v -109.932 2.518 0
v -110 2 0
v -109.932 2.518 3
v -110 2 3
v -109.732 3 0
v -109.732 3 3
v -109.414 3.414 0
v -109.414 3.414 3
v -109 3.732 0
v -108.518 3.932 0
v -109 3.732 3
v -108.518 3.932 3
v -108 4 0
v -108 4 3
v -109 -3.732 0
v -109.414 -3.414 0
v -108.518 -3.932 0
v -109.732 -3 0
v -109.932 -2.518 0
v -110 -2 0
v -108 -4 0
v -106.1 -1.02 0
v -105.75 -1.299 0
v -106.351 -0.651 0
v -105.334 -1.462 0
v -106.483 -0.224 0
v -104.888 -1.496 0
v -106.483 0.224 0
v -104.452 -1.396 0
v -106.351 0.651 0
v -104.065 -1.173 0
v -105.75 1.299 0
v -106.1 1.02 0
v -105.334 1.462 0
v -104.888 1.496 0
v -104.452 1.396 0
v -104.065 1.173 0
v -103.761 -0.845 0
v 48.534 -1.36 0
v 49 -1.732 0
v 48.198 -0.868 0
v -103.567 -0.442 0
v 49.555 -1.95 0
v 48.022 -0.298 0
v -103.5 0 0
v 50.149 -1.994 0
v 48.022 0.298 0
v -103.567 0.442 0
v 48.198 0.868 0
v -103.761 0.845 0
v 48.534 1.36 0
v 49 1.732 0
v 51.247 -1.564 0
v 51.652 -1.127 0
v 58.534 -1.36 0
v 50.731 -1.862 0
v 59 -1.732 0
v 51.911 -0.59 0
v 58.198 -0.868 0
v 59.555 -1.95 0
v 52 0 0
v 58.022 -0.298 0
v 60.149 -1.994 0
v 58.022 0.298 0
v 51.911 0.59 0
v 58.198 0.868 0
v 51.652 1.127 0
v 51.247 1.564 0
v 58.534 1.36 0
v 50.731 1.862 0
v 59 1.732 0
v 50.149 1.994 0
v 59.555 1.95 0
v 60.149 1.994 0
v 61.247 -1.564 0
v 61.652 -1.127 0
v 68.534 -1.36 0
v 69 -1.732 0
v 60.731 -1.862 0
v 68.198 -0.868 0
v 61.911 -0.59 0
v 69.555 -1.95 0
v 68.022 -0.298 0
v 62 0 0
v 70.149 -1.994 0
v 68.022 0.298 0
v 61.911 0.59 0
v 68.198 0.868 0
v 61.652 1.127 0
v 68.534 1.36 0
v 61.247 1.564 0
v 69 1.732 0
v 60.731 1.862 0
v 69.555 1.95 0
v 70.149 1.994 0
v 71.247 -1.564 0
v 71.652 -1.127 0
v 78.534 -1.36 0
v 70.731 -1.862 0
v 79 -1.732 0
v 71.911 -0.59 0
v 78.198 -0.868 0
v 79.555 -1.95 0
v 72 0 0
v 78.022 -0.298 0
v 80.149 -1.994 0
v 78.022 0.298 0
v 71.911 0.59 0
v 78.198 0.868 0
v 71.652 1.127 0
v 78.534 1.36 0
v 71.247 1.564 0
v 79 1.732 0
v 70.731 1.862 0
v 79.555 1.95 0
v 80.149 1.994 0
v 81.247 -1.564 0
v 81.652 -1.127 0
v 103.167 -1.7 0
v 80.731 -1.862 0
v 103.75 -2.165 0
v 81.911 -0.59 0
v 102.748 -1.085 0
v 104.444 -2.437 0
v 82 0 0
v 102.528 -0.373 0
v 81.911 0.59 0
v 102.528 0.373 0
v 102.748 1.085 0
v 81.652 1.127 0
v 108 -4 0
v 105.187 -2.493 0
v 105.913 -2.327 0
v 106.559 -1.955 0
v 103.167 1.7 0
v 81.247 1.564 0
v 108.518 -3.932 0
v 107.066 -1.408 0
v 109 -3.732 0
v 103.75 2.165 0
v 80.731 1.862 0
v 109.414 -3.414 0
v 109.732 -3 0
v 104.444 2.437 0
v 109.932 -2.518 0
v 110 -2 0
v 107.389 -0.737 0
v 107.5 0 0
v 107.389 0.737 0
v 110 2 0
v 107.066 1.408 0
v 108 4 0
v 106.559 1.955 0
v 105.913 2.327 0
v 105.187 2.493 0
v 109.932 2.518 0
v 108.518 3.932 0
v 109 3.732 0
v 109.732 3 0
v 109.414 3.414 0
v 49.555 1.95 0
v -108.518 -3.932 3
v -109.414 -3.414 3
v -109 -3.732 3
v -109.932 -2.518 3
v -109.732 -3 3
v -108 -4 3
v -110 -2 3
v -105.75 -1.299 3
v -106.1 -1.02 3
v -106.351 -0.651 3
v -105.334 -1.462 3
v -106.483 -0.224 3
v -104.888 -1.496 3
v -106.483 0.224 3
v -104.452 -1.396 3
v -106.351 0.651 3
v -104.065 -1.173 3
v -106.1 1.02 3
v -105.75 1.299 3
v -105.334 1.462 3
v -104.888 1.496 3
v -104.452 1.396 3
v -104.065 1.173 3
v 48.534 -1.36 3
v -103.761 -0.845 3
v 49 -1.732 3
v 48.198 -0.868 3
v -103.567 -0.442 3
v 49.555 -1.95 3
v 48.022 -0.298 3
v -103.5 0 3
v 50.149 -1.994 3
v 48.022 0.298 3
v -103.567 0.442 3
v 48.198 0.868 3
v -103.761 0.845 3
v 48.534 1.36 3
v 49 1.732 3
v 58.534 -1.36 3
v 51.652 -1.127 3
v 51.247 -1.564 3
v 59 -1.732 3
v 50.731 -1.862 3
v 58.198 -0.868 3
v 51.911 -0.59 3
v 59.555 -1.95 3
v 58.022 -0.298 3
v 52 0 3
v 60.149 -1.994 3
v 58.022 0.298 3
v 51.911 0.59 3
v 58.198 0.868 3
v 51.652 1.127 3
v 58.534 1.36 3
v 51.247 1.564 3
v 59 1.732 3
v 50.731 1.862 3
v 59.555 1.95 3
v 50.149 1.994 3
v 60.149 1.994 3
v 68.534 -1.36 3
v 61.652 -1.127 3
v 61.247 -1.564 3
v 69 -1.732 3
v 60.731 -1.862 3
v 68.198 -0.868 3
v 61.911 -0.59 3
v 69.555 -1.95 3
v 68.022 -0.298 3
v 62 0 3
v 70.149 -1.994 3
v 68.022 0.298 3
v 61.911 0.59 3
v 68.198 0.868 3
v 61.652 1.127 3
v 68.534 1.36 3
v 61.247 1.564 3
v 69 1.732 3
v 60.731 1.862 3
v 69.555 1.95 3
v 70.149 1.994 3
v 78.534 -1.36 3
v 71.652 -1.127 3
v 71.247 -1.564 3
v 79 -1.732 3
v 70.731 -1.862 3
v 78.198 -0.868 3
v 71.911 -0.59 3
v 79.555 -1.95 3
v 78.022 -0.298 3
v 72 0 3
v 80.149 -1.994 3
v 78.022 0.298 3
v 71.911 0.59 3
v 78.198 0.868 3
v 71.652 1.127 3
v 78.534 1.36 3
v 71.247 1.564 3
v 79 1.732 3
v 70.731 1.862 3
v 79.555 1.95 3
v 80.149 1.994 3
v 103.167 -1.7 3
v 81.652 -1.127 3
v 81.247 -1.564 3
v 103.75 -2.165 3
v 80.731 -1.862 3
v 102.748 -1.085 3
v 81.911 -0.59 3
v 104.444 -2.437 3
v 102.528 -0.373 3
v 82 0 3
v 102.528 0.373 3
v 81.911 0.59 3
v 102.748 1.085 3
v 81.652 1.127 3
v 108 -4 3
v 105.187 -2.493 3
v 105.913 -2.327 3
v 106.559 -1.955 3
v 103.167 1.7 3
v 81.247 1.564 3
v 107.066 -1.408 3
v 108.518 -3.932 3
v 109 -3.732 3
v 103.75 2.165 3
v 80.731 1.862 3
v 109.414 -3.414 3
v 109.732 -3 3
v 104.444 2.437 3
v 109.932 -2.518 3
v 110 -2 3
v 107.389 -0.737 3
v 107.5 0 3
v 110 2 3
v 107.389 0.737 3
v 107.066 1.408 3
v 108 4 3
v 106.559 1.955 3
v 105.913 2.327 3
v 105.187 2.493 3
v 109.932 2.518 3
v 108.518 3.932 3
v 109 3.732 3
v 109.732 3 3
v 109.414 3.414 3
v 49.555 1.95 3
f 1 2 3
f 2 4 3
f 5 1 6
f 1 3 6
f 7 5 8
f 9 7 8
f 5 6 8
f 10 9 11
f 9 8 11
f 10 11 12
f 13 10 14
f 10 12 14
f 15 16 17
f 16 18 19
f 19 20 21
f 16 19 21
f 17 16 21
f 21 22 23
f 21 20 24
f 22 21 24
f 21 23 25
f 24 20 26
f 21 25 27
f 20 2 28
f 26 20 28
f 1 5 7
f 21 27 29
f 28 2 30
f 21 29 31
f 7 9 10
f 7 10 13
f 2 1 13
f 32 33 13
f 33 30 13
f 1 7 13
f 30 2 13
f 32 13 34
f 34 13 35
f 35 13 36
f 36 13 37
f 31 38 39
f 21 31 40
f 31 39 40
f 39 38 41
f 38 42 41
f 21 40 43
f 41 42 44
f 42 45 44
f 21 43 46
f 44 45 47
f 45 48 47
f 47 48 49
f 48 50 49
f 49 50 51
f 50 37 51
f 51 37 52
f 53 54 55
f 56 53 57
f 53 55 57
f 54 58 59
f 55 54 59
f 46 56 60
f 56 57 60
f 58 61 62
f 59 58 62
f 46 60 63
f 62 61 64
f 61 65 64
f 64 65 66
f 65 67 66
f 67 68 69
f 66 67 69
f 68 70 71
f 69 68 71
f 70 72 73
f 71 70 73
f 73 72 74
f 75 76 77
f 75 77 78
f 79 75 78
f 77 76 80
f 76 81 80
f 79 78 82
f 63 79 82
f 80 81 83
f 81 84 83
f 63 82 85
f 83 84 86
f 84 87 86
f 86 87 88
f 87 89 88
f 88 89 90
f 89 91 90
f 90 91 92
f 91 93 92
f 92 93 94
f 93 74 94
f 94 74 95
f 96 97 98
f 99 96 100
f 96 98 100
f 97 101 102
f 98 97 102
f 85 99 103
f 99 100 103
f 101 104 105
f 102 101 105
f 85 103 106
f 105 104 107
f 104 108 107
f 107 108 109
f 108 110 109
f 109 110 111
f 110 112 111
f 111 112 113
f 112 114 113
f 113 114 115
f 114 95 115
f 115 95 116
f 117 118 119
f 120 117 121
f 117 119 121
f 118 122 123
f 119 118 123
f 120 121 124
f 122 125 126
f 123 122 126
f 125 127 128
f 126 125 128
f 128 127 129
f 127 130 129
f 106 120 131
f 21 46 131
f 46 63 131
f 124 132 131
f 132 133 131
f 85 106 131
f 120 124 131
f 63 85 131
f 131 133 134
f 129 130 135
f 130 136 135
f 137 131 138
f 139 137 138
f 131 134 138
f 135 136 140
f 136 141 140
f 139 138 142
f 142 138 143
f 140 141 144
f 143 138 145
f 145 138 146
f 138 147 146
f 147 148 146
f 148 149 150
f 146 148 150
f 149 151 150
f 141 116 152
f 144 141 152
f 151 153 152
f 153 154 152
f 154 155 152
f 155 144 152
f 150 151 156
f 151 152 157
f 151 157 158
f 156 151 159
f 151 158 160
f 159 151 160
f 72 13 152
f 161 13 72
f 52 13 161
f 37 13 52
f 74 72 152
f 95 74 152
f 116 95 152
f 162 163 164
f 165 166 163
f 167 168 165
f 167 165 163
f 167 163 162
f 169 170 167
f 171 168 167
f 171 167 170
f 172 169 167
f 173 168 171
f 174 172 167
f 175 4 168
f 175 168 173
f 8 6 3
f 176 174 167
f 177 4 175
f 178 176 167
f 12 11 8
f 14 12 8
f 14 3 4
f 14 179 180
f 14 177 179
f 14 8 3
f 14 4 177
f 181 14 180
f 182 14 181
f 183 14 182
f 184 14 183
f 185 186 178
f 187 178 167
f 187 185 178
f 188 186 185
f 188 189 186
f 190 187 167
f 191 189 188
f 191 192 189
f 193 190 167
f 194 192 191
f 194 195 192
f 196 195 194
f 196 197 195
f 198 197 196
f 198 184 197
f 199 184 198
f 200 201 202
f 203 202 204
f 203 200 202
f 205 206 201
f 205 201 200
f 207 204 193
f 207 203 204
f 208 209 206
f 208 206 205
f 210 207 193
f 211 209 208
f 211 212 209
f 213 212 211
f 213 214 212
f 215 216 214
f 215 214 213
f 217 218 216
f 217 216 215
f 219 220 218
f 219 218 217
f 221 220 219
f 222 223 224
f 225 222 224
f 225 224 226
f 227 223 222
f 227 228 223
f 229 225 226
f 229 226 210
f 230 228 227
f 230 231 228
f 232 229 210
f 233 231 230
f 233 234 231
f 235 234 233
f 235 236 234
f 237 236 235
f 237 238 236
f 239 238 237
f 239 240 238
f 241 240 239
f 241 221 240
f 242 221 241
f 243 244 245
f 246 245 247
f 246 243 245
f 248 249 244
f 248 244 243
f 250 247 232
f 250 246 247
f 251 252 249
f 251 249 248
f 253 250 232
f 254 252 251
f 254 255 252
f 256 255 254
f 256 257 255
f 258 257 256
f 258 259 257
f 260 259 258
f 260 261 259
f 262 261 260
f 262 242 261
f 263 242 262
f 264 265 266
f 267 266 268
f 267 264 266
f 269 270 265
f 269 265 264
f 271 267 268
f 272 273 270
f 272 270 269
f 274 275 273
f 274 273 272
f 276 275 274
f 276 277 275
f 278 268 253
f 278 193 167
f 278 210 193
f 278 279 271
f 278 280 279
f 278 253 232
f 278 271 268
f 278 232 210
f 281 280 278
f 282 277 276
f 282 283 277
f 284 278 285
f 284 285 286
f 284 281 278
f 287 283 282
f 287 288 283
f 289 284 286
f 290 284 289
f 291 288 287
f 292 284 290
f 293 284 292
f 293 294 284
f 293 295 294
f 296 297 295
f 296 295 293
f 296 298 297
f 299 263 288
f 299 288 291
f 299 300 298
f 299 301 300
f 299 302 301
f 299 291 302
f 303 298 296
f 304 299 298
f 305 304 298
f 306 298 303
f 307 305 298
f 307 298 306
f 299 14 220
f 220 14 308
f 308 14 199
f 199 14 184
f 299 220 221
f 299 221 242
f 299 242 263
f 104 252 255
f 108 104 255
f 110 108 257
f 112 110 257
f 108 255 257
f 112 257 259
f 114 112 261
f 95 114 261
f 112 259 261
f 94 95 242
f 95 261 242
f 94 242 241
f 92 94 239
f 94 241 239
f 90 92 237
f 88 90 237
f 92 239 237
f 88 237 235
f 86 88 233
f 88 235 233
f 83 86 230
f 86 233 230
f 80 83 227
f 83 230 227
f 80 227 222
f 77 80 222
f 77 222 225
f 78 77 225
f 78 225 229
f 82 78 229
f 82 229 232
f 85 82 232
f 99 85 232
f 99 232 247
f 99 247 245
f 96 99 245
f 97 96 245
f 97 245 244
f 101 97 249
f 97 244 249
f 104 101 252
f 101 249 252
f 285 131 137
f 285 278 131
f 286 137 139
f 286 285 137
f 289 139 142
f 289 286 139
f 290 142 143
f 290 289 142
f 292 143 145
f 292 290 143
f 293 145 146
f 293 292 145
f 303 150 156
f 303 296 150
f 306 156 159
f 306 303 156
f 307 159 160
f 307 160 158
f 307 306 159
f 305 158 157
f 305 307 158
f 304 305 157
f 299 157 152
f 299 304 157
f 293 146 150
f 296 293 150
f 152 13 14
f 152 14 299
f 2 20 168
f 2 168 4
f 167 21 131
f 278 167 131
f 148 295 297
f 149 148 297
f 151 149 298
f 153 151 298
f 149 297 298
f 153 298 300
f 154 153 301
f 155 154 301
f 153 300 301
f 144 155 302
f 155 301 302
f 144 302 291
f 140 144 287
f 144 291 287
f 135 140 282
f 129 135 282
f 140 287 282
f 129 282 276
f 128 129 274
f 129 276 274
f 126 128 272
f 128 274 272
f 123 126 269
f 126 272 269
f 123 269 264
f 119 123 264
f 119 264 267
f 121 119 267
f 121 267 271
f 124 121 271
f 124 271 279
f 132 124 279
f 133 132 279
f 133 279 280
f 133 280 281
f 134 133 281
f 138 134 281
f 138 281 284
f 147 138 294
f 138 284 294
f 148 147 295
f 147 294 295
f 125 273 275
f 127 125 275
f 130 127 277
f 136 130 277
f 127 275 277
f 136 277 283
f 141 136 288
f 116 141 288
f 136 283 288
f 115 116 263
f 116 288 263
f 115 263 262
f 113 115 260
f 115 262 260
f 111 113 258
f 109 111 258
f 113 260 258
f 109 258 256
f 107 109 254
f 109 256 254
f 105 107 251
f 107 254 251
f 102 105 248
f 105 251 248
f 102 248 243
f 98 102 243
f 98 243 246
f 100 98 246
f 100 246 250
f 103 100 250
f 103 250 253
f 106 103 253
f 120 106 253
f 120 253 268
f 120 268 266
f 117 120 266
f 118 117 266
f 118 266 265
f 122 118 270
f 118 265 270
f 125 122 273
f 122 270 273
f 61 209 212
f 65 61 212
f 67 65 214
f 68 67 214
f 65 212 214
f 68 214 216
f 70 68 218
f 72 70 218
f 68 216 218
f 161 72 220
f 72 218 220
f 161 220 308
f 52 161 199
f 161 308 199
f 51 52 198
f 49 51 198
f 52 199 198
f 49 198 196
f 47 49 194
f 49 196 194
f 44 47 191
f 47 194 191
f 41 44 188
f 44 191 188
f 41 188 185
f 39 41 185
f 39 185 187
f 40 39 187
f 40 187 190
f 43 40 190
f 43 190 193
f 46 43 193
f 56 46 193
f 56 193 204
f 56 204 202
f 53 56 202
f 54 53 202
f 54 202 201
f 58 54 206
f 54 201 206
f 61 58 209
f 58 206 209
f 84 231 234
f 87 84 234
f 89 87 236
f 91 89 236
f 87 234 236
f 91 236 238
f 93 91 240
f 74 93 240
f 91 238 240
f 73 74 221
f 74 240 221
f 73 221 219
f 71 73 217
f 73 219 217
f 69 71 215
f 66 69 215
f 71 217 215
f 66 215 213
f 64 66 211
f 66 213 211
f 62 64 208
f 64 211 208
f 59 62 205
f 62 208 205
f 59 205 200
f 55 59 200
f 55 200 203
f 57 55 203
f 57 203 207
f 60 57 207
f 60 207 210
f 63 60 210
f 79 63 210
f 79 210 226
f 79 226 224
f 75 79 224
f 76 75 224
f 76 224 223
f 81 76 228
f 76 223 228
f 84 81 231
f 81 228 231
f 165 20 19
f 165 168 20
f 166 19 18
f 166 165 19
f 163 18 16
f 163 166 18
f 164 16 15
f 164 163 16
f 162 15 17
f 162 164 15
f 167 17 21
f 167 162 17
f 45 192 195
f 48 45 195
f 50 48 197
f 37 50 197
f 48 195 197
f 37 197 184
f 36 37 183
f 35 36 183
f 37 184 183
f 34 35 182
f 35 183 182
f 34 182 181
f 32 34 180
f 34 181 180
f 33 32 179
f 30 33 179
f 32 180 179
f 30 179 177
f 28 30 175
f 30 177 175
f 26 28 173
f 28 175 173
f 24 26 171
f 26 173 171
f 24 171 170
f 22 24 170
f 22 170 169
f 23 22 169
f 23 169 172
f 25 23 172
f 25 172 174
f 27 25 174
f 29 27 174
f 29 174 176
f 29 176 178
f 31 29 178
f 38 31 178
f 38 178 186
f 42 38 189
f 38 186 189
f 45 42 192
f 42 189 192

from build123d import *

# Parameters (mm, degrees)
SKETCH1_W           = 220
SKETCH1_H           = 8
BOSS_EXTRUDE1_DEPTH = 3
FILLET1_R           = 2
SKETCH2_R           = 1.5
CUT_EXTRUDE1_DEPTH  = 3
SKETCH3_R           = 2.5
CUT_EXTRUDE2_DEPTH  = 3
SKETCH4_R           = 2
CUT_EXTRUDE3_DEPTH  = 3
LPATTERN1_COUNT     = 4
LPATTERN1_PITCH     = 10


with BuildPart() as part:
    # Sketch1 → Boss-Extrude1 (new body)
    with BuildSketch(Plane.XY):
        Rectangle(SKETCH1_W, SKETCH1_H)
    extrude(amount=BOSS_EXTRUDE1_DEPTH)

    # Fillet1
    fillet1_edges = [part.edges().sort_by_distance(p)[0] for p in [
        (110, -4, 1.5),
        (-110, -4, 1.5),
        (-110, 4, 1.5),
        (110, 4, 1.5),
    ]]
    fillet(fillet1_edges, radius=FILLET1_R)

    # Sketch2 → Cut-Extrude1 (cut)
    with BuildSketch(Plane.XY.offset(3)):
        with Locations((-105, 0)):
            Circle(SKETCH2_R)
    extrude(amount=-CUT_EXTRUDE1_DEPTH, mode=Mode.SUBTRACT)

    # Sketch3 → Cut-Extrude2 (cut)
    with BuildSketch(Plane.XY.offset(3)):
        with Locations((105, 0)):
            Circle(SKETCH3_R)
    extrude(amount=-CUT_EXTRUDE2_DEPTH, mode=Mode.SUBTRACT)

    # Sketch4 → Cut-Extrude3 (cut)
    with BuildSketch(Plane.XY.offset(3)):
        with Locations((80, 0)):
            Circle(SKETCH4_R)
    cut_extrude3 = extrude(amount=-CUT_EXTRUDE3_DEPTH, mode=Mode.SUBTRACT)

    # LPattern1: Cut-Extrude3 ×4
    with Locations(*[(-i * LPATTERN1_PITCH, 0, 0) for i in range(1, LPATTERN1_COUNT)]):
        add(cut_extrude3, mode=Mode.SUBTRACT)


solid = part.part
